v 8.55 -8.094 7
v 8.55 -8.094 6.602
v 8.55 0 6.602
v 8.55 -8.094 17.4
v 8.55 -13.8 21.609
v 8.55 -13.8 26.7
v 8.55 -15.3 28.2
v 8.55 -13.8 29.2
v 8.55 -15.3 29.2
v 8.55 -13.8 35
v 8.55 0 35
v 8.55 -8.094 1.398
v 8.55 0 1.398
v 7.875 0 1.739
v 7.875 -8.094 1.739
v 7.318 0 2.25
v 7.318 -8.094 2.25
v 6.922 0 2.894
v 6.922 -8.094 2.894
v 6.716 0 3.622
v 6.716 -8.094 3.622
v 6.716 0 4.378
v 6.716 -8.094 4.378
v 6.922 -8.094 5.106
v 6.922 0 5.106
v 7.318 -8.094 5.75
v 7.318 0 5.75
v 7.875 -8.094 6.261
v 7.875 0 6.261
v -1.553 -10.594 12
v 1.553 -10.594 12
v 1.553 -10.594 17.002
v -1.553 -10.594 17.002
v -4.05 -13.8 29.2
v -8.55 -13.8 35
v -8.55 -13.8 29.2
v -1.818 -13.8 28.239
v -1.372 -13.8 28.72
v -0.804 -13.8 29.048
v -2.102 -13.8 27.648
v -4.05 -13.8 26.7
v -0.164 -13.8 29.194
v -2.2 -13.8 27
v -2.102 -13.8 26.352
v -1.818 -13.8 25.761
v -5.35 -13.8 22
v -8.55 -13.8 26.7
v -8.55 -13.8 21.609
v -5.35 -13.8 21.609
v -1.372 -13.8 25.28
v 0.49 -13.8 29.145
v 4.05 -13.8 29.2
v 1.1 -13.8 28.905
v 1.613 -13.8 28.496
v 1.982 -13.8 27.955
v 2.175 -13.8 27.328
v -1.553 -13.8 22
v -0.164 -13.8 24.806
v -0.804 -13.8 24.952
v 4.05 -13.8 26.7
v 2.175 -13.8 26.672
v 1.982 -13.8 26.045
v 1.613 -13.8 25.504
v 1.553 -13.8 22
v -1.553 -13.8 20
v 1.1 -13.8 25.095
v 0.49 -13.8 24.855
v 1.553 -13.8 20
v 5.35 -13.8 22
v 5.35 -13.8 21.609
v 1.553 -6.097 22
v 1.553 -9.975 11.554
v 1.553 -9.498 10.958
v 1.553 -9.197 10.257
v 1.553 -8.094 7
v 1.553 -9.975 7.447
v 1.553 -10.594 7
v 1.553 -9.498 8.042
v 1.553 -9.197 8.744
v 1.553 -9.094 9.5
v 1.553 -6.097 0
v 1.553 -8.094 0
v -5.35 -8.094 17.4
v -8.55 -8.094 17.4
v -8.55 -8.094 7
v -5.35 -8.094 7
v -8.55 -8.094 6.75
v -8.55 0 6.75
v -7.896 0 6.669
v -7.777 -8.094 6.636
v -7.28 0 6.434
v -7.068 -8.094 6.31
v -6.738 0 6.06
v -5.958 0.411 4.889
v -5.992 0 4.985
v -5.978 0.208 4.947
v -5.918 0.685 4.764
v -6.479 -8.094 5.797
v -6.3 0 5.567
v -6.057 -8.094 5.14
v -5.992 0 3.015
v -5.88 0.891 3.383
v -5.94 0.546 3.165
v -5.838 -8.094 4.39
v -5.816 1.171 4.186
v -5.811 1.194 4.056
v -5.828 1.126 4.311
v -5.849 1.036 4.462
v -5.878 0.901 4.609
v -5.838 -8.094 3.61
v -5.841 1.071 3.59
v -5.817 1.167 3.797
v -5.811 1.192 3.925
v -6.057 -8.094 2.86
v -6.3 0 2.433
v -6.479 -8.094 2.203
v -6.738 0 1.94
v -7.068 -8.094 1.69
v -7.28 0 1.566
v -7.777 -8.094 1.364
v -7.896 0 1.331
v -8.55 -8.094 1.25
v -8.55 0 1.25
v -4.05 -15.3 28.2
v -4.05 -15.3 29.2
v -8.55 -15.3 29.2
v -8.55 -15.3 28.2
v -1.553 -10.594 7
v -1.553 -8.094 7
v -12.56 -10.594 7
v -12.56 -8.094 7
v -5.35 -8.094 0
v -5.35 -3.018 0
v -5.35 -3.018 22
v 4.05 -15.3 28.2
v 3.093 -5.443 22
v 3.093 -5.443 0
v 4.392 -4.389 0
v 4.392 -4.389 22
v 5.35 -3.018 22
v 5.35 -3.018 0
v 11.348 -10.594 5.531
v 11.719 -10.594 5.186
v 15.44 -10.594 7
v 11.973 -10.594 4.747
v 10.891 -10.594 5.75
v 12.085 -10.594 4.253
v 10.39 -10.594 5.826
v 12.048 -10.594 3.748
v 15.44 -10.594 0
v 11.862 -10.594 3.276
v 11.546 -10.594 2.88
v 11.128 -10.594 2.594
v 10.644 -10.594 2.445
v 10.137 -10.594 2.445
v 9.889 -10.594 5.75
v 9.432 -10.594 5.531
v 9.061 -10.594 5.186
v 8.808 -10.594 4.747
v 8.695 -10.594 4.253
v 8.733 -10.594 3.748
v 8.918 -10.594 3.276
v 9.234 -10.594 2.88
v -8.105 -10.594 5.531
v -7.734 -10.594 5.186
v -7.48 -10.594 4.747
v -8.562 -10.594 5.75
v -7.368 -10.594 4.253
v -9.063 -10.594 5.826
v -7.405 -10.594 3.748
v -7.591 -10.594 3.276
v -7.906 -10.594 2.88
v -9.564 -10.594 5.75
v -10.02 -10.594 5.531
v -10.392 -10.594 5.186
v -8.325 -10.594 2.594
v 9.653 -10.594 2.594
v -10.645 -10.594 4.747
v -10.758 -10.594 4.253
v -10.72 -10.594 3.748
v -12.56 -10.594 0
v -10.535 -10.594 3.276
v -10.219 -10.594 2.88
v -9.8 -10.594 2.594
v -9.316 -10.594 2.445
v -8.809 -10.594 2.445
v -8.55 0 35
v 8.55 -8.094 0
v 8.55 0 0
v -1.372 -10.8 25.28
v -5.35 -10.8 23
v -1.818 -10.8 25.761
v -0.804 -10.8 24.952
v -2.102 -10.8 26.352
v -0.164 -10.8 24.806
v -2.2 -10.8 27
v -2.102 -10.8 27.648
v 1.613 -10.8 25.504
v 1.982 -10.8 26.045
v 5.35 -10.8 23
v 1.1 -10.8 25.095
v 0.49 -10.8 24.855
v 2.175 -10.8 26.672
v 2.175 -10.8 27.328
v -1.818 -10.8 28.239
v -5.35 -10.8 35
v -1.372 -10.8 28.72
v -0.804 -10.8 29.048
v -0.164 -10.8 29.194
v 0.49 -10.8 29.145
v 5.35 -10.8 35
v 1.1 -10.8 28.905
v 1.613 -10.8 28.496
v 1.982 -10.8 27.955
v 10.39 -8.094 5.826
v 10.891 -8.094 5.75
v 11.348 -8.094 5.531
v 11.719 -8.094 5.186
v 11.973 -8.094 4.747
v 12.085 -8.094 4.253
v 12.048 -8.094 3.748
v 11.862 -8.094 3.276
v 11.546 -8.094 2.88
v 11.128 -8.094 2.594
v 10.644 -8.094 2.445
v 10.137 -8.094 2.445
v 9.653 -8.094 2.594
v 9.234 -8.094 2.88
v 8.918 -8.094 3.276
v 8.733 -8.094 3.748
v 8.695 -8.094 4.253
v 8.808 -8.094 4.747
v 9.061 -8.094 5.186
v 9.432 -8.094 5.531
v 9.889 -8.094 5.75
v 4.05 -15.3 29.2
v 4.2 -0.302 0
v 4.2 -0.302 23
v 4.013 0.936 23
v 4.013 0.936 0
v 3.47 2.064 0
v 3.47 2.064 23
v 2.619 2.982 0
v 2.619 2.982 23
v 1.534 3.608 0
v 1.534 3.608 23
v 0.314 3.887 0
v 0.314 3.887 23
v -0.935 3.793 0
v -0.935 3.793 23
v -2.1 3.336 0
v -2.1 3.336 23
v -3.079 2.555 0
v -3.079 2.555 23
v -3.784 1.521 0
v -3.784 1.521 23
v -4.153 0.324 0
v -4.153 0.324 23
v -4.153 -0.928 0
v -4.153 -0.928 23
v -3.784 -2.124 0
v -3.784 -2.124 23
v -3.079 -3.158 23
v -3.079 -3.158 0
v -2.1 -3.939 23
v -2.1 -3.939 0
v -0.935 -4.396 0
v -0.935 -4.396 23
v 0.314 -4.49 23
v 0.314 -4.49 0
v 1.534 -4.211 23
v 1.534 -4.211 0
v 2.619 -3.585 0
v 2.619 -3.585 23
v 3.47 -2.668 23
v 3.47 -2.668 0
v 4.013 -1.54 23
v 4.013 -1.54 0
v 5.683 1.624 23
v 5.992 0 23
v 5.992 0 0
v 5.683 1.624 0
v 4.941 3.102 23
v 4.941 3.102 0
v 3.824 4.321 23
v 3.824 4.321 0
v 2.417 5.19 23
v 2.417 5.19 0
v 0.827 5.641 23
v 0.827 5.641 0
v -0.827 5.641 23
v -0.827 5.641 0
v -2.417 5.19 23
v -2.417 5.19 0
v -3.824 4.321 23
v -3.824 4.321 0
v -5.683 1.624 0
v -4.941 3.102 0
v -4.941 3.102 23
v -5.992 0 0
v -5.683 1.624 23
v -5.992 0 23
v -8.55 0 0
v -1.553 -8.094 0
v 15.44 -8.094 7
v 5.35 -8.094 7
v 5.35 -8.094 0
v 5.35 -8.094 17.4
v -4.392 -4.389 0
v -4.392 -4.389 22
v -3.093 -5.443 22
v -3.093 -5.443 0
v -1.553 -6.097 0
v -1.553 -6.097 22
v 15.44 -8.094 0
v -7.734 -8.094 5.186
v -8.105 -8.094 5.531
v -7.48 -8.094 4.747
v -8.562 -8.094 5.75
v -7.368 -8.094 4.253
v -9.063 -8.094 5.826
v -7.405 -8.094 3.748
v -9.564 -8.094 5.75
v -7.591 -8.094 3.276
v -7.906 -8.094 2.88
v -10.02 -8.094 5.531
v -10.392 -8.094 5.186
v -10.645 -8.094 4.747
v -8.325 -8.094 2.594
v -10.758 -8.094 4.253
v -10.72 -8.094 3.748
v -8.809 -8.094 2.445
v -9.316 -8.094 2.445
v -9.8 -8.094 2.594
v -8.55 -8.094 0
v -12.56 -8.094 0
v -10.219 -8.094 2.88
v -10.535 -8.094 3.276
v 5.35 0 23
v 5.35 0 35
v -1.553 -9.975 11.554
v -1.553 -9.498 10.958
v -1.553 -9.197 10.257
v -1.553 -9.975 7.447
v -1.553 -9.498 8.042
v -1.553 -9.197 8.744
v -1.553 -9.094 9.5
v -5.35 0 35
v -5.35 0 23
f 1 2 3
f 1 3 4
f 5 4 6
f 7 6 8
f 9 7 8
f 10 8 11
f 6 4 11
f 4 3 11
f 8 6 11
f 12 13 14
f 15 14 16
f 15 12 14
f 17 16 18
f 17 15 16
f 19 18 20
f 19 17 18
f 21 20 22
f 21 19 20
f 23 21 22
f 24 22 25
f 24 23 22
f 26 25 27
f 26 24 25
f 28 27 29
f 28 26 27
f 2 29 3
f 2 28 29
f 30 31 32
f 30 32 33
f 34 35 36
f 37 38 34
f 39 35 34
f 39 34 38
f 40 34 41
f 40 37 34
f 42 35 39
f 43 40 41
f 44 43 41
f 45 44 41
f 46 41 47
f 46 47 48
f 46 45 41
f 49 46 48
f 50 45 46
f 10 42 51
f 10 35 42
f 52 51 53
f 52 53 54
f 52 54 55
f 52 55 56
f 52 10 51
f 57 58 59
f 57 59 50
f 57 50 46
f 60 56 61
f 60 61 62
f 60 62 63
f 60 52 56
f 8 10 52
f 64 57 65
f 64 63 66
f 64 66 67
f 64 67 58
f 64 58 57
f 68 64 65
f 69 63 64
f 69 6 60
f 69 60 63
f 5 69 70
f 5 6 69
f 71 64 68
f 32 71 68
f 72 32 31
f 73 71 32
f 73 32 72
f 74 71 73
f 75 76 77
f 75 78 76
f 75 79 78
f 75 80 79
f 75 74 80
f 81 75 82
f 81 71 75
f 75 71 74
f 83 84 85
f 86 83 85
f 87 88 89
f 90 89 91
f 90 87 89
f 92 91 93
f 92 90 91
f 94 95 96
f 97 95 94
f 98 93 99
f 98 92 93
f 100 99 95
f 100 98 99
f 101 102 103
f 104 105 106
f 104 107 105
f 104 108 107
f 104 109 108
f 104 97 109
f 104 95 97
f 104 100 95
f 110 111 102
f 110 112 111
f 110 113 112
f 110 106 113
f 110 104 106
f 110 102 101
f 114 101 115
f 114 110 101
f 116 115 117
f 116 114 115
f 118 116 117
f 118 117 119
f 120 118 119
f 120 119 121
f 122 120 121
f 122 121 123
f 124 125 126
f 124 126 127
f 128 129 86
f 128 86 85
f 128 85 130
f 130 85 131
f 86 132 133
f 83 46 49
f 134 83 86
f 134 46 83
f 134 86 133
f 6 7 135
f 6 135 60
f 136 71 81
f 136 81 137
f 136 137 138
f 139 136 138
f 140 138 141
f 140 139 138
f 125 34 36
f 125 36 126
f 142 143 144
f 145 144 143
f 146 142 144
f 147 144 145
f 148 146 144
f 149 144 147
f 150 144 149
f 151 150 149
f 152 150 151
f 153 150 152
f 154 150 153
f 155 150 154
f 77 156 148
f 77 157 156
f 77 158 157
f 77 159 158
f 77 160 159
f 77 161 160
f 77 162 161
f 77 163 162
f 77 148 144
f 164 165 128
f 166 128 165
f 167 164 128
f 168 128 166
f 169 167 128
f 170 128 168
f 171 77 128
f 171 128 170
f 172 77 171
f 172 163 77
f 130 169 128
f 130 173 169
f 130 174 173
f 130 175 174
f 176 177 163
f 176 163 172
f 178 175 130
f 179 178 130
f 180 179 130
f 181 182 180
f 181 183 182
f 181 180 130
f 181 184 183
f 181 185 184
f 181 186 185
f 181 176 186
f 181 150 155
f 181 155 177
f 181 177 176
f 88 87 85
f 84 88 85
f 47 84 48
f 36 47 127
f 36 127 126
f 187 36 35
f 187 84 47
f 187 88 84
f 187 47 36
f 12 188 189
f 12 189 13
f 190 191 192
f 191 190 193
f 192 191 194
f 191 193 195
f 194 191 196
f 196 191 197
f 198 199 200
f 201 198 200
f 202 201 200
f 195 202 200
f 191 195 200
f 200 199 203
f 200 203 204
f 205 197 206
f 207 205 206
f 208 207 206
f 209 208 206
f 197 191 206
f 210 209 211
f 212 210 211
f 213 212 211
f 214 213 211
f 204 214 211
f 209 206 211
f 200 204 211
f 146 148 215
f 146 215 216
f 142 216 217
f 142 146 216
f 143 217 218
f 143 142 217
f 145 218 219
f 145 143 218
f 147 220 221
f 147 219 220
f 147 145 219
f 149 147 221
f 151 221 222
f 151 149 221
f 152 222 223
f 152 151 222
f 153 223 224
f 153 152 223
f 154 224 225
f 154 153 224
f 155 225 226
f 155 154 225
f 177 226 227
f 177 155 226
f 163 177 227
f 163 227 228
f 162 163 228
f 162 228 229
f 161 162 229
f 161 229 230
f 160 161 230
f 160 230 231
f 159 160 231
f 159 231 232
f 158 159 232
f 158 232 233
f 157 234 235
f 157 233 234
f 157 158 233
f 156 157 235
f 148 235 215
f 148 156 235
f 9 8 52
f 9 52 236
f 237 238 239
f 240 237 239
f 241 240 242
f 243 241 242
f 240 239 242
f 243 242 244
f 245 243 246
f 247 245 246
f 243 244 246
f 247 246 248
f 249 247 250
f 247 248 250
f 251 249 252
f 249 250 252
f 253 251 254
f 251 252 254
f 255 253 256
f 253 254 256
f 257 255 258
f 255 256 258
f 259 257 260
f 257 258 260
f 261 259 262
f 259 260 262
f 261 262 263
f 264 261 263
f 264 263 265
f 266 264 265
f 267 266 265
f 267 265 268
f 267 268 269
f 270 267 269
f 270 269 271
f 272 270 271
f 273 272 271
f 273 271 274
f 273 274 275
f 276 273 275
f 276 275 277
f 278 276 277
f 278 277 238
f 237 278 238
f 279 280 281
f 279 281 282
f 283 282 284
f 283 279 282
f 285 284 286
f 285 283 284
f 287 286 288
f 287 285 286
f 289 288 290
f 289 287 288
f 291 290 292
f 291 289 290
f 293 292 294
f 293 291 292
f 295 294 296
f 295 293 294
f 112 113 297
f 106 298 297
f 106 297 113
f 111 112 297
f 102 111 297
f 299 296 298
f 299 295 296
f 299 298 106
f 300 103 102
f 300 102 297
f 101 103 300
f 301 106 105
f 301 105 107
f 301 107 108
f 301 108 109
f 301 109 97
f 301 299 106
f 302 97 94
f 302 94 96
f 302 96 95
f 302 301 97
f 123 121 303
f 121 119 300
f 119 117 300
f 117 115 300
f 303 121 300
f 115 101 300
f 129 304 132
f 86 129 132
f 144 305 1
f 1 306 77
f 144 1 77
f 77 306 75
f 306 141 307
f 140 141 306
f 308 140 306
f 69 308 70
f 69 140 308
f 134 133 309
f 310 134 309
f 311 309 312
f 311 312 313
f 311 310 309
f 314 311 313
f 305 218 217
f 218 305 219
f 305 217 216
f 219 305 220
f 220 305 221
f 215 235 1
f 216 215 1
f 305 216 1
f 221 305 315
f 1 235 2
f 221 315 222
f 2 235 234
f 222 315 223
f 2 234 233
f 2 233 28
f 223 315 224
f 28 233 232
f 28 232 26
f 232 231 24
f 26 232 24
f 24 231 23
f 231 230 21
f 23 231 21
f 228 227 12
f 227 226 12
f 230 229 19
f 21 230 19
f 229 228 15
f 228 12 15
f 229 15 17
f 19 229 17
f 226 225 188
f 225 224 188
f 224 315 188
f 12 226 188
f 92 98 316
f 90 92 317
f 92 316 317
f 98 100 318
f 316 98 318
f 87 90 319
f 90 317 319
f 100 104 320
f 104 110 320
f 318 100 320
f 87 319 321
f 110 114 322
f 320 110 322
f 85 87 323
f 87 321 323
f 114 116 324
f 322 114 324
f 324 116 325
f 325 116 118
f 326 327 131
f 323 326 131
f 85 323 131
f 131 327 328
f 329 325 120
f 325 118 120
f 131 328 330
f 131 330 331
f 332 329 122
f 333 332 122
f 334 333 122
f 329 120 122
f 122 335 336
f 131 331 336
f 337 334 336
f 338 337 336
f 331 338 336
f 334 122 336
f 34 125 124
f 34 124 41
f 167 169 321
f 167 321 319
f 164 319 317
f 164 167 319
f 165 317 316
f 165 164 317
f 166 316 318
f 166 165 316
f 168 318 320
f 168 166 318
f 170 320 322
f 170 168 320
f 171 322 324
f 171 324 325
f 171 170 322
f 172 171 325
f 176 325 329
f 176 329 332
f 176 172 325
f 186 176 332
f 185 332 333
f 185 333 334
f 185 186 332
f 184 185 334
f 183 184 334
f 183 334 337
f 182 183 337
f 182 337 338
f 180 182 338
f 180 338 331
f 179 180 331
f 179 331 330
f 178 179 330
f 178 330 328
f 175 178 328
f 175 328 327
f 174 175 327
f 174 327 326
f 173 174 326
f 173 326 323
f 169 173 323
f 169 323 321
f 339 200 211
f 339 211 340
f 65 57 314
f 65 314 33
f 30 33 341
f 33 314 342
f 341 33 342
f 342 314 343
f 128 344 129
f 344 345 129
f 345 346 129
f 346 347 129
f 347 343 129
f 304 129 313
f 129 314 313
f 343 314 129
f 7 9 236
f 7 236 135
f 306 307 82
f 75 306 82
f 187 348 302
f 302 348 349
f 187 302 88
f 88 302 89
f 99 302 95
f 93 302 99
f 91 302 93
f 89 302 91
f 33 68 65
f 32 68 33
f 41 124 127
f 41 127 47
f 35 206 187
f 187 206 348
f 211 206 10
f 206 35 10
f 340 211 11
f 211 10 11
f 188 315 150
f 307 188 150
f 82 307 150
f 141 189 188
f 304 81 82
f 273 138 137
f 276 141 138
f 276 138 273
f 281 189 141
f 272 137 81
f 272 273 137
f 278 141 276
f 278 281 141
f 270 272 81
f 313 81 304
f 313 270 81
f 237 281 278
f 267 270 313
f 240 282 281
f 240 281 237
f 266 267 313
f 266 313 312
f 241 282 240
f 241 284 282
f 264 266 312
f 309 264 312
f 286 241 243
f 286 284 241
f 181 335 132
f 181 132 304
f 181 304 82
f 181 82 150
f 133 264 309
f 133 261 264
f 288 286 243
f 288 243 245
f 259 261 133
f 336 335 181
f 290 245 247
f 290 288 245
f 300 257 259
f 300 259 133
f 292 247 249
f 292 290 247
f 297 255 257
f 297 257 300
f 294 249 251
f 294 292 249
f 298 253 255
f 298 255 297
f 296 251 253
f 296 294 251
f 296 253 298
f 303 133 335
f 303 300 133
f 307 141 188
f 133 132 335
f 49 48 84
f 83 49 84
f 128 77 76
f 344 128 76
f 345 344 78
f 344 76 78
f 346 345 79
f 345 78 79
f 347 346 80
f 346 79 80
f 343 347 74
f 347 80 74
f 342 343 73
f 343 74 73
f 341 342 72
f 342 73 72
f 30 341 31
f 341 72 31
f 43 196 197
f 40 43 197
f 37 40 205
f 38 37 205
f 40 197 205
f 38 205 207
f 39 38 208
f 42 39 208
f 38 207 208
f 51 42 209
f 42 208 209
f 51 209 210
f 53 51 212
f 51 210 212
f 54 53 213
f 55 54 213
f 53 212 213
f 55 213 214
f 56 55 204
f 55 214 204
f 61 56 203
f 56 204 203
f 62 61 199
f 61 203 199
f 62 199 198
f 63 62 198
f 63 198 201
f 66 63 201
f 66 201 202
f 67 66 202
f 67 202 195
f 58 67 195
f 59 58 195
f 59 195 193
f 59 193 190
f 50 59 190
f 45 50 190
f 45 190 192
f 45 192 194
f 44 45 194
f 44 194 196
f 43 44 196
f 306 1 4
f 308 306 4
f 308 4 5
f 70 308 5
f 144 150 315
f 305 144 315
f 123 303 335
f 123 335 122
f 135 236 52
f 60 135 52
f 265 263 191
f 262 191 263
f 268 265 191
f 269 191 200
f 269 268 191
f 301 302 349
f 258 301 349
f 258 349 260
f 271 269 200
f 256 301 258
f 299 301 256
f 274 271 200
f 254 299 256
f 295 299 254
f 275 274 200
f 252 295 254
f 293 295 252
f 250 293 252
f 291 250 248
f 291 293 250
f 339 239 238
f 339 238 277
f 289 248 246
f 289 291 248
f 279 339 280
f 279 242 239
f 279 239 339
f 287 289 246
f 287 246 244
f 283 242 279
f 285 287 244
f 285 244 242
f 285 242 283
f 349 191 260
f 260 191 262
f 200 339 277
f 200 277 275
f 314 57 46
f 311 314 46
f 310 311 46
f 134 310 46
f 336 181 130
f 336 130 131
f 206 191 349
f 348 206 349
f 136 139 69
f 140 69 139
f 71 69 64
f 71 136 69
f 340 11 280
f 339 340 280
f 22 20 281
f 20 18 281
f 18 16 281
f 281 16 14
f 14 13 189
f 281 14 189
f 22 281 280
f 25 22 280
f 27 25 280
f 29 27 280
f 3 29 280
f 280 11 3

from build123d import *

# Parameters (mm, degrees)
BOSS_EXTRUDE1_DEPTH      = 8.55
SKETCH2_W                = 10.7
SKETCH2_H                = 10.8
CUT_EXTRUDE1_DEPTH       = 12
SKETCH3_R                = 6
BOSS_EXTRUDE2_DEPTH      = 23
SKETCH4_R                = 4.2
CUT_EXTRUDE2_DEPTH       = 29.152131358
BOSS_EXTRUDE5_DEPTH      = 17.1
CUT_EXTRUDE4_REACH       = 36.056
SKETCH10_W               = 8.1
SKETCH10_H               = 1.5
SKETCH7_R                = 2.2
CUT_EXTRUDE3_DEPTH       = 40.626944786
CUT_EXTRUDE9_START       = -22
CUT_EXTRUDE9_DEPTH       = 22
BOSS_EXTRUDE6_DEPTH      = 1.553
SKETCH16_W               = 28
SKETCH16_H               = 2.5
BOSS_EXTRUDE8_DEPTH      = 7
CUT_EXTRUDE8_DEPTH       = 6.997
CUT_EXTRUDE10_REACH      = 42.722
SKETCH19_R               = 2.83394
CUT_EXTRUDE11_DEPTH      = 41.664727171
CUT_EXTRUDE11_DEPTH_BACK = 41.664727171
SKETCH20_R               = 1.7
SKETCH21_R               = 2.75
CUT_EXTRUDE12_DEPTH      = 41.664727171
CUT_EXTRUDE13_REACH      = 47.107


with BuildPart() as part:
    # Sketch1 → Boss-Extrude1 (new, symmetric)
    with BuildSketch(Plane(origin=(0, 0, 0), x_dir=(0, 0, -1), z_dir=(1, 0, 0))):
        Polygon((0, 0), (0, -8.09401), (-21.6094, -13.8), (-35, -13.8), (-35, 0), align=None)
    extrude(amount=BOSS_EXTRUDE1_DEPTH, both=True)

    # Sketch2 → Cut-Extrude1 (cut)
    with BuildSketch(Plane.XY.offset(35)):
        with Locations((0, -5.4)):
            Rectangle(SKETCH2_W, SKETCH2_H)
    extrude(amount=-CUT_EXTRUDE1_DEPTH, mode=Mode.SUBTRACT)

    # Sketch3 → Boss-Extrude2 (add, through all)
    with BuildSketch(Plane.XY.offset(23)):
        with Locations((0, -0.30175)):
            Circle(SKETCH3_R)
    extrude(amount=-BOSS_EXTRUDE2_DEPTH)

    # Sketch4 → Cut-Extrude2 (cut, through all)
    with BuildSketch(Plane.XY.offset(23)):
        with Locations((0, -0.30175)):
            Circle(SKETCH4_R)
    extrude(amount=-CUT_EXTRUDE2_DEPTH, mode=Mode.SUBTRACT)

    # Sketch8 → Boss-Extrude5 (add, through all)
    with BuildSketch(Plane(origin=(8.55, 0, 0), x_dir=(0, 0, -1), z_dir=(1, 0, 0))):
        Polygon((-29.2, -13.8), (-29.2, -15.3), (-28.2, -15.3), (-26.7, -13.8), align=None)
    extrude(amount=-BOSS_EXTRUDE5_DEPTH)

    # Cut-Extrude4: up to this plane
    cut_extrude4_end = Plane(origin=(-8.55, -15.3, 28.2), z_dir=(0, -0.7071067811865467, -0.7071067811865483))
    # Sketch10 → Cut-Extrude4 (cut, up to the surface)
    with BuildSketch(Plane.XY.offset(29.2), mode=Mode.PRIVATE) as cut_extrude4_sk1:
        with Locations((0, -14.55)):
            Rectangle(SKETCH10_W, SKETCH10_H)
    cut_extrude4_tool1 = split(extrude(cut_extrude4_sk1.sketch, amount=-CUT_EXTRUDE4_REACH, mode=Mode.PRIVATE), bisect_by=cut_extrude4_end, keep=Keep.BOTH, mode=Mode.PRIVATE)
    add(cut_extrude4_tool1.solids().sort_by_distance((0, -14.55, 29.2))[0], mode=Mode.SUBTRACT)

    # Sketch7 → Cut-Extrude3 (cut, through all)
    with BuildSketch(Plane(origin=(0, -10.8, 0), x_dir=(1, 0, 0), z_dir=(0, 1, 0))):
        with Locations(Location((0, -27, 0), (0, 0, 180))):
            Circle(SKETCH7_R)
    extrude(amount=-CUT_EXTRUDE3_DEPTH, mode=Mode.SUBTRACT)

    # Sketch18 → Cut-Extrude9 (cut)
    with BuildSketch(Plane(origin=(0, 0, 0), x_dir=(-1, 0, 0), z_dir=(0, 0, -1)).offset(CUT_EXTRUDE9_START)):
        with BuildLine():
            Line((-5.35, -3.017905371), (-5.35, -13.8))
            Line((-5.35, -13.8), (5.35, -13.8))
            Line((5.35, -13.8), (5.35, -3.017905371))
            ThreePointArc((5.35, -3.017905371), (0, -6.30175), (-5.35, -3.017905371))
        make_face()
    extrude(amount=CUT_EXTRUDE9_DEPTH, mode=Mode.SUBTRACT)

    # Sketch14 → Boss-Extrude6 (add, symmetric)
    with BuildSketch(Plane(origin=(0, 0, 0), x_dir=(0, 0, -1), z_dir=(1, 0, 0))):
        Polygon((-20, -13.8), (-17.001986023, -10.59401), (0, -10.59401), (0, -4.8), (-22, -4.8), (-22, -13.8), align=None)
    extrude(amount=BOSS_EXTRUDE6_DEPTH, both=True)

    # Sketch16 → Boss-Extrude8 (add)
    with BuildSketch(Plane(origin=(0, 0, 0), x_dir=(-1, 0, 0), z_dir=(0, 0, -1))):
        with Locations((-1.44, -9.34401)):
            Rectangle(SKETCH16_W, SKETCH16_H)
    extrude(amount=-BOSS_EXTRUDE8_DEPTH)

    # Sketch17 → Cut-Extrude8 (cut)
    with BuildSketch(Plane(origin=(8.55, 0, 0), x_dir=(0, 0, -1), z_dir=(1, 0, 0))):
        Polygon((-7, -8.09401), (-17.4, -8.09401), (-21.6094, -13.8), (-7, -13.8), align=None)
    extrude(amount=-CUT_EXTRUDE8_DEPTH, mode=Mode.SUBTRACT)

    # Sketch19 → Cut-Extrude10 (cut, up to next)
    with BuildSketch(Plane(origin=(1.553, 0, 0), x_dir=(0, 0, -1), z_dir=(1, 0, 0)), mode=Mode.PRIVATE) as cut_extrude10_sk1:
        with Locations((-9.50021991, -11.92822)):
            Circle(SKETCH19_R)
    cut_extrude10_tool1 = extrude(cut_extrude10_sk1.sketch, amount=-CUT_EXTRUDE10_REACH, mode=Mode.PRIVATE) & part.part
    add(cut_extrude10_tool1.solids().sort_by_distance((1.553, -11.92822, 9.50022))[0], mode=Mode.SUBTRACT)

    # Sketch20 → Cut-Extrude11 (cut, two sides: drawn at the far end of the back side and taken through both)
    with BuildSketch(Plane(origin=(0, -8.09401, 0), x_dir=(1, 0, 0), z_dir=(0, 1, 0)).offset(-CUT_EXTRUDE11_DEPTH_BACK)):
        with Locations(Location((-9.06279, -4.126, 0), (0, 0, 270))):
            Circle(SKETCH20_R)
        with Locations(Location((10.39013, -4.126, 0), (0, 0, 270))):
            Circle(SKETCH20_R)
    extrude(amount=CUT_EXTRUDE11_DEPTH + CUT_EXTRUDE11_DEPTH_BACK, mode=Mode.SUBTRACT)

    # Sketch21 → Cut-Extrude12 (cut, through all)
    with BuildSketch(Plane(origin=(0, -8.09401, 0), x_dir=(1, 0, 0), z_dir=(0, 1, 0))):
        with Locations((-8.56, -4)):
            Circle(SKETCH21_R)
        with Locations((9.44, -4)):
            Circle(SKETCH21_R)
    extrude(amount=CUT_EXTRUDE12_DEPTH, mode=Mode.SUBTRACT)

    # Sketch22 → Cut-Extrude13 (cut, up to next)
    with BuildSketch(Plane.ZY.offset(8.55), mode=Mode.PRIVATE) as cut_extrude13_sk1:
        Polygon((17.4, -8.09401), (7, -8.09401), (7, -9.942369047), (21.6094, -13.8), align=None)
    cut_extrude13_tool1 = extrude(cut_extrude13_sk1.sketch, amount=-CUT_EXTRUDE13_REACH, mode=Mode.PRIVATE) & part.part
    add(cut_extrude13_tool1.solids().sort_by_distance((-8.55, -10.188689, 14.252315))[0], mode=Mode.SUBTRACT)


solid = part.part
